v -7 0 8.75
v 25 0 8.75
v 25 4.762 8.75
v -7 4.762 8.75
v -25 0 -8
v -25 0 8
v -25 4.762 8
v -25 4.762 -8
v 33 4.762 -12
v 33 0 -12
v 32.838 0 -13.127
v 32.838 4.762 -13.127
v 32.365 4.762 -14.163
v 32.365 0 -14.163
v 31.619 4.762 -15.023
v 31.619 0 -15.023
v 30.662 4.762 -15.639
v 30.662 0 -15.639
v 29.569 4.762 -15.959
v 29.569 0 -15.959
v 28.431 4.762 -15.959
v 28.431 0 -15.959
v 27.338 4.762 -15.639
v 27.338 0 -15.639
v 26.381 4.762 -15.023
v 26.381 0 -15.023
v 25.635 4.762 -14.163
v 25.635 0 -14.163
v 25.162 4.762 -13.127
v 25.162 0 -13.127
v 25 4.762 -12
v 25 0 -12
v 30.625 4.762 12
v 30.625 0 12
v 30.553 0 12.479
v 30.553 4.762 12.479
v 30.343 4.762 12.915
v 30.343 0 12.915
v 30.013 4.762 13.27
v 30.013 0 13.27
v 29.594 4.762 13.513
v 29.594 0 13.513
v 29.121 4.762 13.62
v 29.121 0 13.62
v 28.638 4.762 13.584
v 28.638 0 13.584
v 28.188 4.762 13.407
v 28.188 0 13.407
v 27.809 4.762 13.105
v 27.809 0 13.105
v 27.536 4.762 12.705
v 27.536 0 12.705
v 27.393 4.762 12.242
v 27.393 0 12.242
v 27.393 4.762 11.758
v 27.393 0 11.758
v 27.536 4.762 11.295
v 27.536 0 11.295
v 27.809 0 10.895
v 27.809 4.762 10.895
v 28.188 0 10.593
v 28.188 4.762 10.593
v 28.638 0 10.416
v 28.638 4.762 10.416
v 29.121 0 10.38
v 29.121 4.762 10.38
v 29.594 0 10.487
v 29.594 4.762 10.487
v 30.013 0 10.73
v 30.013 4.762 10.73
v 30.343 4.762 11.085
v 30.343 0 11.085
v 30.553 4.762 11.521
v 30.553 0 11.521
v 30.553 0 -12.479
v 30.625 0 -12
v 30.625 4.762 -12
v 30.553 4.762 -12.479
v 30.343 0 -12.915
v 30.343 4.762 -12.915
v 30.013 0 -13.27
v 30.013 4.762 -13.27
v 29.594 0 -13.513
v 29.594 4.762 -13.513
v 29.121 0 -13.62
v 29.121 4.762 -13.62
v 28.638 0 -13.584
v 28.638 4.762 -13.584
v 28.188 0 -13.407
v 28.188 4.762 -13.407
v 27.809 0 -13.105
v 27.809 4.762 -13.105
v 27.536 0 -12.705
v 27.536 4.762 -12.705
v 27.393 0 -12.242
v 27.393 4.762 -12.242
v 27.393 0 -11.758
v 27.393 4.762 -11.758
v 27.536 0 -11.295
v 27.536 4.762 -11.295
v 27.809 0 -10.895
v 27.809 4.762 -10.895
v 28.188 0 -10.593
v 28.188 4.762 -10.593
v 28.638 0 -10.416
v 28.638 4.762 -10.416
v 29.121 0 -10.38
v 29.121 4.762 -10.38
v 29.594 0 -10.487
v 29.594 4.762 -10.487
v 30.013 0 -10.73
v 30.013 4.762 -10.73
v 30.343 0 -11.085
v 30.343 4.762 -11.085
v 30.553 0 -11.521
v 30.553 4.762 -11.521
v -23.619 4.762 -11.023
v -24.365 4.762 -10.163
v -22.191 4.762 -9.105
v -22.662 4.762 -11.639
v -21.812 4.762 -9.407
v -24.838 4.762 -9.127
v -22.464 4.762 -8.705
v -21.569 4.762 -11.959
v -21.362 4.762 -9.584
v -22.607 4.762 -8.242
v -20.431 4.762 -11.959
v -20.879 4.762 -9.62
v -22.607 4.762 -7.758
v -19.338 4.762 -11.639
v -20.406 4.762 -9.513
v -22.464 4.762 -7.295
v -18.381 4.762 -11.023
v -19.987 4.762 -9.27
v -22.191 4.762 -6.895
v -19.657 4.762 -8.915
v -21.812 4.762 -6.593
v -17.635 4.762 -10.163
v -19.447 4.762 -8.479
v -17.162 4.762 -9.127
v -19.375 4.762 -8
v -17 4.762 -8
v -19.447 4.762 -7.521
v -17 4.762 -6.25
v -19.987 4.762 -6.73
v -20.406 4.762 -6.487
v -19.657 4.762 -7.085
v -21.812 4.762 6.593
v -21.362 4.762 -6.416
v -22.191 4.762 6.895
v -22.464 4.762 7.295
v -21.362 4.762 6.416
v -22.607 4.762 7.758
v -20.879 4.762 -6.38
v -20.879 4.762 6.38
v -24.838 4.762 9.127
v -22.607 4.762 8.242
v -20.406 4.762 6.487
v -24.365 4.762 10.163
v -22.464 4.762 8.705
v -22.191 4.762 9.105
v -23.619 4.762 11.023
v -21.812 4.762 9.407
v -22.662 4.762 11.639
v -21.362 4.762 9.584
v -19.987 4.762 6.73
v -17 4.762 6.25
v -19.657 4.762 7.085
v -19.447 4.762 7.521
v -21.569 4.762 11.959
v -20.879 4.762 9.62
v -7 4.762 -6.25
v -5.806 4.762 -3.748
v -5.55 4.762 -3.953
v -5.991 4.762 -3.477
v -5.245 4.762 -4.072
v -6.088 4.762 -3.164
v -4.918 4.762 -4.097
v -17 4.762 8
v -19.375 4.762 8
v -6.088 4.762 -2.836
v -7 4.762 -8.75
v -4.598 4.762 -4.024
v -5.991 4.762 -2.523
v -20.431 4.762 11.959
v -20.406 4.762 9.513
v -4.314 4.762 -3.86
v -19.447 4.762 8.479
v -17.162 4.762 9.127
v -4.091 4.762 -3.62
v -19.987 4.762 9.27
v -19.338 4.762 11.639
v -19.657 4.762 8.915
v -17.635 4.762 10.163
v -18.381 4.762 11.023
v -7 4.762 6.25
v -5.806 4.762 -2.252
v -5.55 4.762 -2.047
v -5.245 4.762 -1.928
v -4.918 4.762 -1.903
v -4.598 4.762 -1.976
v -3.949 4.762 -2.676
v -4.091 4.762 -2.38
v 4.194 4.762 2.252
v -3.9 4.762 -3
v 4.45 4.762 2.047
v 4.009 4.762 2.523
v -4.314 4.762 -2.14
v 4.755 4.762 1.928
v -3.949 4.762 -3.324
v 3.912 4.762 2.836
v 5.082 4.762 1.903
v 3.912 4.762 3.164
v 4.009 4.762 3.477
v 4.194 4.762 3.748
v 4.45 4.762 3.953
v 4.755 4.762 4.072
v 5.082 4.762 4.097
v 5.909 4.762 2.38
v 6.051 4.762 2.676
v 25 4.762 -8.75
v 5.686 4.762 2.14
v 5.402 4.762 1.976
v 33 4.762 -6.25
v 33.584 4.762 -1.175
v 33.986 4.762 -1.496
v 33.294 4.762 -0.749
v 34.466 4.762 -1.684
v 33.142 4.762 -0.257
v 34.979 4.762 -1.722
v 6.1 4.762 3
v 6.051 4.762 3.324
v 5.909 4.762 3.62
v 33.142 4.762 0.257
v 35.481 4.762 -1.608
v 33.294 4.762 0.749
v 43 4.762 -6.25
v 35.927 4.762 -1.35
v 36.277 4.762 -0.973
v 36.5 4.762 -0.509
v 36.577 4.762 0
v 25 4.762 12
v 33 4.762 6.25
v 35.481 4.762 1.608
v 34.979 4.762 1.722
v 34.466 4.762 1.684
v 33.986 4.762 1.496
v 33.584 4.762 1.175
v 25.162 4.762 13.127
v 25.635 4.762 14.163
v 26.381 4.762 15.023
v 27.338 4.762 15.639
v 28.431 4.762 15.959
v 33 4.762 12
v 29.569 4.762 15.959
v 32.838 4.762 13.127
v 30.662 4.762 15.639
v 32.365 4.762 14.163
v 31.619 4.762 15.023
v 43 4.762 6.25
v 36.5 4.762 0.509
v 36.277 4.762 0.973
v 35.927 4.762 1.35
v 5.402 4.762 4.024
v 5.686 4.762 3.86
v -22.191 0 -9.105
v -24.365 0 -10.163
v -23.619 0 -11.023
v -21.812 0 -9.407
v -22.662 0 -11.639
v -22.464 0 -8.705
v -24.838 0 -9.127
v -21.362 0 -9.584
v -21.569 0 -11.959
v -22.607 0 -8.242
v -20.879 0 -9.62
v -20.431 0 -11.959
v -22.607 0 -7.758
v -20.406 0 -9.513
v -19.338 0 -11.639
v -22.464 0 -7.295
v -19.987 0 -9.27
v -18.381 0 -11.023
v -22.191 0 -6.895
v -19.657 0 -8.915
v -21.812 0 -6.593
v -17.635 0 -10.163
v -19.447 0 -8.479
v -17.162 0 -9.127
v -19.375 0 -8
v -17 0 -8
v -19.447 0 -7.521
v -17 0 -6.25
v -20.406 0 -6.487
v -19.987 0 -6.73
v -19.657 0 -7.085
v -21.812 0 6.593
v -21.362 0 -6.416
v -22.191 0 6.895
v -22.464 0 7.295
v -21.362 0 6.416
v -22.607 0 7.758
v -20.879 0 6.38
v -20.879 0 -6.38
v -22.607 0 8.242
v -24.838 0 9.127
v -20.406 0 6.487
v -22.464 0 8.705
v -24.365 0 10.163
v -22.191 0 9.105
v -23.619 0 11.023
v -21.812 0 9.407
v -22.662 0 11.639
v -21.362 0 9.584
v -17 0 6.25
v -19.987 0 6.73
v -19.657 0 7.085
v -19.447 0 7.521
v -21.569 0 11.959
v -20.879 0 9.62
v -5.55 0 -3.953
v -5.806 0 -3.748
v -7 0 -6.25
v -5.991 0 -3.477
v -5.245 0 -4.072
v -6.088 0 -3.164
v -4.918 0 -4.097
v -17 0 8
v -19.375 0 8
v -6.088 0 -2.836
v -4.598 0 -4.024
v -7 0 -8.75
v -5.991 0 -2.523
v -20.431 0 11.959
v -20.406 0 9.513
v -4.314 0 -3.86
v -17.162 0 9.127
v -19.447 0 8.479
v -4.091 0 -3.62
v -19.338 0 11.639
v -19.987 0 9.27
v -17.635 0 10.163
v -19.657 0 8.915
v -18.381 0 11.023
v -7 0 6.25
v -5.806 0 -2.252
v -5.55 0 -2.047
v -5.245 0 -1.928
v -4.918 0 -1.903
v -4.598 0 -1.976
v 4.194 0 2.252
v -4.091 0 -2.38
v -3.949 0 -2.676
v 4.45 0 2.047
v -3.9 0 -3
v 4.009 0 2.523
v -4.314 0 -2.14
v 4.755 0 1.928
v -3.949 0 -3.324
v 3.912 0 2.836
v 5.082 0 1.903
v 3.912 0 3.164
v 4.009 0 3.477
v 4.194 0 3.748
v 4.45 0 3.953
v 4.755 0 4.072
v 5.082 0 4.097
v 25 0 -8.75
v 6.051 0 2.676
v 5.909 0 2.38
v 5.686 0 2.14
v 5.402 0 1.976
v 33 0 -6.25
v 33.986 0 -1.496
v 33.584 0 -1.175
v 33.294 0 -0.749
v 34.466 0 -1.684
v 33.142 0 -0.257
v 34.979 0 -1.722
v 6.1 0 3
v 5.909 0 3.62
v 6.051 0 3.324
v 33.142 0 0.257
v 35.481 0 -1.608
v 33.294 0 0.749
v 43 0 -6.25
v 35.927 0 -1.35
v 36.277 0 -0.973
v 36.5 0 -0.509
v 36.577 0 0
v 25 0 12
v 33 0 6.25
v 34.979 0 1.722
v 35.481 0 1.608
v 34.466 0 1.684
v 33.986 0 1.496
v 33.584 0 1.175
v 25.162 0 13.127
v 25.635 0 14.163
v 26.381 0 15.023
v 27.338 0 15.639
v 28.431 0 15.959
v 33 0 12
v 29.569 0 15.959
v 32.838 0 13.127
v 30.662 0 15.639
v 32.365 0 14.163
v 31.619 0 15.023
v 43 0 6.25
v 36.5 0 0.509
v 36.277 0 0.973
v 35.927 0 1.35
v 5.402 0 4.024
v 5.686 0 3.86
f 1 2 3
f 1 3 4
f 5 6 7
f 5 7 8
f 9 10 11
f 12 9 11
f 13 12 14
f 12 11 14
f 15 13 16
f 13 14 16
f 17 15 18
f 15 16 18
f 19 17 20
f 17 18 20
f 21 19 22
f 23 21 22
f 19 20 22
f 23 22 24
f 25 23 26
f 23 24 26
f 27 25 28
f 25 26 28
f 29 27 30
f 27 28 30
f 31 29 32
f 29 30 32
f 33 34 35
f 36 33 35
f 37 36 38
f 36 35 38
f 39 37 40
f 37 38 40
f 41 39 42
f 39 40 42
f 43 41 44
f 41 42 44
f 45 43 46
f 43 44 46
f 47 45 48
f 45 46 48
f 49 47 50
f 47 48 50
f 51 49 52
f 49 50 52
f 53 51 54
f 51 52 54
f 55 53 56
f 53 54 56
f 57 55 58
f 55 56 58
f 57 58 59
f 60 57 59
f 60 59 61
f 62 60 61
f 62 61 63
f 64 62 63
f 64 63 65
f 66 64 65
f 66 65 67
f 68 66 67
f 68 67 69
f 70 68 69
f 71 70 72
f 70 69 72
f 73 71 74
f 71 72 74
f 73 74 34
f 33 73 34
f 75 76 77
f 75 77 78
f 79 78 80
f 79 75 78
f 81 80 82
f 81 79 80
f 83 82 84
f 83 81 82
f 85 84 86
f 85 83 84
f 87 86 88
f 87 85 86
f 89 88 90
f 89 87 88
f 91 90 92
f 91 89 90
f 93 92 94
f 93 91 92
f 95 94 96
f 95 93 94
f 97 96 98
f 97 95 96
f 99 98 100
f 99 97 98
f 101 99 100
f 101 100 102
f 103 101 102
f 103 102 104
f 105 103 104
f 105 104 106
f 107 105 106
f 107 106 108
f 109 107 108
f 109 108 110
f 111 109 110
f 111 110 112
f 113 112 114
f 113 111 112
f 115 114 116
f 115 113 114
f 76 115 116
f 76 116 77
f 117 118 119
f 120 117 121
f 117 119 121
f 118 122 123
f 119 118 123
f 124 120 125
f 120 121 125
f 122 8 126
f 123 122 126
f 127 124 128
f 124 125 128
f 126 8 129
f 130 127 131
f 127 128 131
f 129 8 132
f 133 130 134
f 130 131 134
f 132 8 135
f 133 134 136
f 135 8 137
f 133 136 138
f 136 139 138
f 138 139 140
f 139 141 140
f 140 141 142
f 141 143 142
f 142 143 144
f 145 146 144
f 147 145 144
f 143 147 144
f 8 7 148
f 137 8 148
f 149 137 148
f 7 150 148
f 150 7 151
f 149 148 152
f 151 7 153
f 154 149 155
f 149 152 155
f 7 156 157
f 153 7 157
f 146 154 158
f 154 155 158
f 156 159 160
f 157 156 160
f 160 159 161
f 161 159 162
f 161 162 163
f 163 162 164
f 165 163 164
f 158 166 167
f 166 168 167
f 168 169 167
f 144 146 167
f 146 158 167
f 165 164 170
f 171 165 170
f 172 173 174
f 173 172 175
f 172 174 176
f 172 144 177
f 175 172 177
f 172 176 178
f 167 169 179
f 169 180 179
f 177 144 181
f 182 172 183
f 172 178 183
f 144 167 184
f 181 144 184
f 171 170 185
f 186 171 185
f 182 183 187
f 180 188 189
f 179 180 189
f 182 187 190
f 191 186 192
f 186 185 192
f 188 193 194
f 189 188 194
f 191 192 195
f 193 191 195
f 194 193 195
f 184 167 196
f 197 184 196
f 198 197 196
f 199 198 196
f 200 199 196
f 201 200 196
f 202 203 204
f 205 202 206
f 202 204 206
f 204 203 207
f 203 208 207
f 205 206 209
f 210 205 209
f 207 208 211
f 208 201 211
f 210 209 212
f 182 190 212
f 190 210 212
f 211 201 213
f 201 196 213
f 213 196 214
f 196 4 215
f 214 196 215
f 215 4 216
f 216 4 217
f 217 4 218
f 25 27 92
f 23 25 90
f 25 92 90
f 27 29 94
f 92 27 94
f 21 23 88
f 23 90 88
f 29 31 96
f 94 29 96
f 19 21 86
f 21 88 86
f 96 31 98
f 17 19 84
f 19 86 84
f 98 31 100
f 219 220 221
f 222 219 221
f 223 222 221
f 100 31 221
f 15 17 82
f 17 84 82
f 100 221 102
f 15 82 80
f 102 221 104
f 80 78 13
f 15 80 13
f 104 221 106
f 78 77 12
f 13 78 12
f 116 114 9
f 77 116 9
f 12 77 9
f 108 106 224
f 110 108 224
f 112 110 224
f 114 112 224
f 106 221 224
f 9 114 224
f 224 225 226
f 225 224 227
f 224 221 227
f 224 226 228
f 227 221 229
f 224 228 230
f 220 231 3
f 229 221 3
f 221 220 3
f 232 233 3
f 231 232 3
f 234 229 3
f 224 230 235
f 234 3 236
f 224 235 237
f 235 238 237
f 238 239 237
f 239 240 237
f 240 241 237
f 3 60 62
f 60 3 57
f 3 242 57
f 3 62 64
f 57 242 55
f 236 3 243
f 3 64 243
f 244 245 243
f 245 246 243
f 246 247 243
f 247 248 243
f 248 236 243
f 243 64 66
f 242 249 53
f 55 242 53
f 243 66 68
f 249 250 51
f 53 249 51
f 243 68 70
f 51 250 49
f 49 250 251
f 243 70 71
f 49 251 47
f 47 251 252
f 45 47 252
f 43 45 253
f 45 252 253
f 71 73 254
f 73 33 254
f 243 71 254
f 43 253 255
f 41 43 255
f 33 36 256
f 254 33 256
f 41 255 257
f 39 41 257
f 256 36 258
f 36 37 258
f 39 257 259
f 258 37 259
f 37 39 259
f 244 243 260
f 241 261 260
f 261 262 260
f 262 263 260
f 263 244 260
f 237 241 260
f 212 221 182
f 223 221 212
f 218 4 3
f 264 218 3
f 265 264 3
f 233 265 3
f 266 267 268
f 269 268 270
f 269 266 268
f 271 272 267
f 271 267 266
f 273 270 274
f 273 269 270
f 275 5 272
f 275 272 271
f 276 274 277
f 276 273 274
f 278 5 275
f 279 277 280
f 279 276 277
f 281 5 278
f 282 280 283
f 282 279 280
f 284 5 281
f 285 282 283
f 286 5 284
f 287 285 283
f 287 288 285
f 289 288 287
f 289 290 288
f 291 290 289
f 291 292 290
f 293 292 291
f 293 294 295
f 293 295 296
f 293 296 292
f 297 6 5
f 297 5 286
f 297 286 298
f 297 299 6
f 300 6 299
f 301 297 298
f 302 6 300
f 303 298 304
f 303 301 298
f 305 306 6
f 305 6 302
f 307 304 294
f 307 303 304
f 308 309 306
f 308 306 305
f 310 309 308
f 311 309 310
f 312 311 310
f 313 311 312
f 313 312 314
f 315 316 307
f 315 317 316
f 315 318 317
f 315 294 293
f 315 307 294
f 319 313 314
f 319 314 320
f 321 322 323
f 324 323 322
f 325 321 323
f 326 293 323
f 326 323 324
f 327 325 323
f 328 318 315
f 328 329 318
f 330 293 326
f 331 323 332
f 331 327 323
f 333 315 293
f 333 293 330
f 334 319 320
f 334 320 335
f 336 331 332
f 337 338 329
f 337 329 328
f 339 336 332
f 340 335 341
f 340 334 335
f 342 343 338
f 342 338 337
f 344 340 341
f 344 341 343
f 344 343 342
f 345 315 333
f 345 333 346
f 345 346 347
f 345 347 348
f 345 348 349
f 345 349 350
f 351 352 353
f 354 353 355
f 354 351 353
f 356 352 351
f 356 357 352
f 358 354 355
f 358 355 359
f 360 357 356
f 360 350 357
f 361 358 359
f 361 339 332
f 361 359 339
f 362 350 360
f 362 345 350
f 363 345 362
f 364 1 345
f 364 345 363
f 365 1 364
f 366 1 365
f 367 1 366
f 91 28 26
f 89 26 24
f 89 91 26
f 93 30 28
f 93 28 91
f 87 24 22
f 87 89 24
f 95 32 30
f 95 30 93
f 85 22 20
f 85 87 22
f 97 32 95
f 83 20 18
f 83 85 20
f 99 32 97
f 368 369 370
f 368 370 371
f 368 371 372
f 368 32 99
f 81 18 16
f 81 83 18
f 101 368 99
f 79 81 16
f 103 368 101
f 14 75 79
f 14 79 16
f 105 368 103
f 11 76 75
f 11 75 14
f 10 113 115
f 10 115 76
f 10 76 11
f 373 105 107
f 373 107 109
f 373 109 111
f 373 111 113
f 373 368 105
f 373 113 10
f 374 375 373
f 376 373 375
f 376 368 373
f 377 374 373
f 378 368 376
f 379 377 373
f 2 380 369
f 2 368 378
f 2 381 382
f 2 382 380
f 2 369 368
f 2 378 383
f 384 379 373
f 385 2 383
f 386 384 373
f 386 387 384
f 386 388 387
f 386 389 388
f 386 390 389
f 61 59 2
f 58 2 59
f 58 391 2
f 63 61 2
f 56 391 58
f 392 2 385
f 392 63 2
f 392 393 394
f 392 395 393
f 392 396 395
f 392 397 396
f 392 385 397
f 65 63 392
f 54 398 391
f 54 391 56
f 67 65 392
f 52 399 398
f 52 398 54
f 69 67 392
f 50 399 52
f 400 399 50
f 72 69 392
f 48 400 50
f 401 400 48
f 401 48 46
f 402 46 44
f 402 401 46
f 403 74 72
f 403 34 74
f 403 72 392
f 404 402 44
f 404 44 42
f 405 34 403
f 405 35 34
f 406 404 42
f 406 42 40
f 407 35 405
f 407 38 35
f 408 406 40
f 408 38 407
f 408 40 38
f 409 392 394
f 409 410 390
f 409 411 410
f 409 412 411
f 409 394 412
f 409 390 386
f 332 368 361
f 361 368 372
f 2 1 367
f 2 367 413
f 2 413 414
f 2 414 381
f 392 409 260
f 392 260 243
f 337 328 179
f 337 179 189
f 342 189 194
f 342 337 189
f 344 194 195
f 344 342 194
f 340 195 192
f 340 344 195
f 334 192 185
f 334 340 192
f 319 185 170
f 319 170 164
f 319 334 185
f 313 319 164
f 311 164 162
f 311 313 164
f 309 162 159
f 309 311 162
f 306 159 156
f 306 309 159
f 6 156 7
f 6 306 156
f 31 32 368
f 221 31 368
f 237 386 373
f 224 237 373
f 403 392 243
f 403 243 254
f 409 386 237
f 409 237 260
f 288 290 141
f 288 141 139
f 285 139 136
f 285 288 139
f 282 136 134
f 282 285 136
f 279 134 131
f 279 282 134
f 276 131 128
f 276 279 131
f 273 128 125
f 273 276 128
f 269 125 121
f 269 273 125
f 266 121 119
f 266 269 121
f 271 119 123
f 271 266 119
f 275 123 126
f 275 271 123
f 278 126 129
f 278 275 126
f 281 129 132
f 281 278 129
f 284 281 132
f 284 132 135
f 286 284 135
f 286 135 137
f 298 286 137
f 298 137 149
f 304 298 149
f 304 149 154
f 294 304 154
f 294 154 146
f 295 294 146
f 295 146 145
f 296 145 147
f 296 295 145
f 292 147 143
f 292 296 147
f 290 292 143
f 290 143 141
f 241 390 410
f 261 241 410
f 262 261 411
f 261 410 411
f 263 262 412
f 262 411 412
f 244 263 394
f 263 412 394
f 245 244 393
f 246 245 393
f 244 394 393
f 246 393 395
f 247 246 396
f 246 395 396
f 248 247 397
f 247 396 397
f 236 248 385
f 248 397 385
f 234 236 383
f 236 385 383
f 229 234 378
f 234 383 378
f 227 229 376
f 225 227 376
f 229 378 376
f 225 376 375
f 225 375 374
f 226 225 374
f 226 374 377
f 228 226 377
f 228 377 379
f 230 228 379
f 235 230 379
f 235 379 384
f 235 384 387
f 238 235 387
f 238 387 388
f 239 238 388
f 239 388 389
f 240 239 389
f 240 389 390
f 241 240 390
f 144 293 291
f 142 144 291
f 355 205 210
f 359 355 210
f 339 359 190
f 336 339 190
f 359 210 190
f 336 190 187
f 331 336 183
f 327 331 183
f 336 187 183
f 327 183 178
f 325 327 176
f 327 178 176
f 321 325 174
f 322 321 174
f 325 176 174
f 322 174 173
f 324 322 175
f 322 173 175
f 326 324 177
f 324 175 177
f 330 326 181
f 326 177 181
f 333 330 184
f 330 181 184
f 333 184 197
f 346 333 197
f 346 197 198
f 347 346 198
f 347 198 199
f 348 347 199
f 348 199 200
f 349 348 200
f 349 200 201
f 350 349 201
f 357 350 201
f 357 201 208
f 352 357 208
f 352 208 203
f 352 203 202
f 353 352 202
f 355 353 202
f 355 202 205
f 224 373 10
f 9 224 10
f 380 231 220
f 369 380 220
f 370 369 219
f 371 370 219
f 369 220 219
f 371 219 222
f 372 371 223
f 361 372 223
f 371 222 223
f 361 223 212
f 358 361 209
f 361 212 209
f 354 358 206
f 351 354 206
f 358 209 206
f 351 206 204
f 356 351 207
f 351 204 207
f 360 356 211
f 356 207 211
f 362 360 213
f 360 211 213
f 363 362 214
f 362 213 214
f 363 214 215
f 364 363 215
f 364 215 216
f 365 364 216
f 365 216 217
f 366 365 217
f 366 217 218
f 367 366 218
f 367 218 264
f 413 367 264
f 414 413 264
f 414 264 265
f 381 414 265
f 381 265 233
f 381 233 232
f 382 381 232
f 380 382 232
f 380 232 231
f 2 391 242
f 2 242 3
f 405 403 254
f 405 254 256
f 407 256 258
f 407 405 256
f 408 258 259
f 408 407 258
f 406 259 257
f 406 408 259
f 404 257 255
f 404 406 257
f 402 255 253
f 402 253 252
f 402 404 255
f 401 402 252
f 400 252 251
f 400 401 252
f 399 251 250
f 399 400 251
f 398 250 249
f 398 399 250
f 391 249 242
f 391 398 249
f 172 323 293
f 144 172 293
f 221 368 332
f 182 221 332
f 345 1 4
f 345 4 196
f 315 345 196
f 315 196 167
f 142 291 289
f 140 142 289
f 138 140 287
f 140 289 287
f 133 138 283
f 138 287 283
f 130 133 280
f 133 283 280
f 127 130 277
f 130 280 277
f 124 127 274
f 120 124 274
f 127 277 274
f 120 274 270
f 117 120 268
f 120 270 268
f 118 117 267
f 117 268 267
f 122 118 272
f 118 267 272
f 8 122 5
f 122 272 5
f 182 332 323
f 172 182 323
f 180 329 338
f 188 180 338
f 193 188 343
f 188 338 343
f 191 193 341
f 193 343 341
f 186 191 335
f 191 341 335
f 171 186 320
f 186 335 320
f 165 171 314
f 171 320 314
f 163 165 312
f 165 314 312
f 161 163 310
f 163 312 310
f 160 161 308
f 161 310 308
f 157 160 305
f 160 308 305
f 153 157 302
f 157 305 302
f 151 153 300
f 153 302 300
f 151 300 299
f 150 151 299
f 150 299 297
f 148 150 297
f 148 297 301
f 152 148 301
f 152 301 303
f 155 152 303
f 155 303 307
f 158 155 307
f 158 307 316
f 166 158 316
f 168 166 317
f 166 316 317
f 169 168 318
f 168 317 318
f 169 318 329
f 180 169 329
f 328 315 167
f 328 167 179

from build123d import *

# Parameters (mm, degrees)
SKETCH1_R                 = 1.625
BOSS_EXTRUDE1_DEPTH       = 4.7625
SKETCH6_R                 = 1.1
CUT_EXTRUDE3_DEPTH        = 5.7625
F_8_32_TAPPED_HOLE1_D     = 3.4544
F_8_32_TAPPED_HOLE1_DEPTH = 12.29
F_8_32_TAPPED_HOLE1_TIP   = 1.037806461


with BuildPart() as part:
    # Sketch1 → Boss-Extrude1 (new body)
    with BuildSketch(Plane(origin=(0, 0, 0), x_dir=(1, 0, 0), z_dir=(0, 1, 0))):
        with BuildLine():
            Line((-17, 6.25), (-17, 8))
            ThreePointArc((-17, 8), (-21, 12), (-25, 8))
            Line((-25, 8), (-25, 0))
            Line((-25, 0), (43, 0))
            Line((43, 0), (43, 6.25))
            Line((43, 6.25), (33, 6.25))
            Line((33, 6.25), (33, 12))
            ThreePointArc((33, 12), (29, 16), (25, 12))
            Line((25, 12), (25, 8.75))
            Line((25, 8.75), (-7, 8.75))
            Line((-7, 8.75), (-7, 6.25))
            Line((-7, 6.25), (-17, 6.25))
        make_face()
        with Locations((-21, 8)):
            Circle(SKETCH1_R, mode=Mode.SUBTRACT)
        with Locations((29, 12)):
            Circle(SKETCH1_R, mode=Mode.SUBTRACT)
    boss_extrude1 = extrude(amount=BOSS_EXTRUDE1_DEPTH)

    # Mirror1: Boss-Extrude1 across plane
    add(boss_extrude1.mirror(Plane.XY))

    # Sketch6 → Cut-Extrude3 (cut, through all)
    with BuildSketch(Plane(origin=(0, 4.7625, 0), x_dir=(1, 0, 0), z_dir=(0, 1, 0))):
        with Locations((5, -3)):
            Circle(SKETCH6_R)
        with Locations((-5, 3)):
            Circle(SKETCH6_R)
    extrude(amount=-CUT_EXTRUDE3_DEPTH, mode=Mode.SUBTRACT)

    # #8-32 Tapped Hole1
    with Locations(Plane(origin=(0, 4.7625, 0), x_dir=(-1, 0, 0), z_dir=(0, 1, 0))):
        with Locations((-34.85, 0)):
            Hole(F_8_32_TAPPED_HOLE1_D / 2, depth=F_8_32_TAPPED_HOLE1_DEPTH)
            with Locations((0, 0, -(F_8_32_TAPPED_HOLE1_DEPTH + F_8_32_TAPPED_HOLE1_TIP / 2))):  # 118° drill point
                Cone(0, F_8_32_TAPPED_HOLE1_D / 2, F_8_32_TAPPED_HOLE1_TIP, mode=Mode.SUBTRACT)


solid = part.part
